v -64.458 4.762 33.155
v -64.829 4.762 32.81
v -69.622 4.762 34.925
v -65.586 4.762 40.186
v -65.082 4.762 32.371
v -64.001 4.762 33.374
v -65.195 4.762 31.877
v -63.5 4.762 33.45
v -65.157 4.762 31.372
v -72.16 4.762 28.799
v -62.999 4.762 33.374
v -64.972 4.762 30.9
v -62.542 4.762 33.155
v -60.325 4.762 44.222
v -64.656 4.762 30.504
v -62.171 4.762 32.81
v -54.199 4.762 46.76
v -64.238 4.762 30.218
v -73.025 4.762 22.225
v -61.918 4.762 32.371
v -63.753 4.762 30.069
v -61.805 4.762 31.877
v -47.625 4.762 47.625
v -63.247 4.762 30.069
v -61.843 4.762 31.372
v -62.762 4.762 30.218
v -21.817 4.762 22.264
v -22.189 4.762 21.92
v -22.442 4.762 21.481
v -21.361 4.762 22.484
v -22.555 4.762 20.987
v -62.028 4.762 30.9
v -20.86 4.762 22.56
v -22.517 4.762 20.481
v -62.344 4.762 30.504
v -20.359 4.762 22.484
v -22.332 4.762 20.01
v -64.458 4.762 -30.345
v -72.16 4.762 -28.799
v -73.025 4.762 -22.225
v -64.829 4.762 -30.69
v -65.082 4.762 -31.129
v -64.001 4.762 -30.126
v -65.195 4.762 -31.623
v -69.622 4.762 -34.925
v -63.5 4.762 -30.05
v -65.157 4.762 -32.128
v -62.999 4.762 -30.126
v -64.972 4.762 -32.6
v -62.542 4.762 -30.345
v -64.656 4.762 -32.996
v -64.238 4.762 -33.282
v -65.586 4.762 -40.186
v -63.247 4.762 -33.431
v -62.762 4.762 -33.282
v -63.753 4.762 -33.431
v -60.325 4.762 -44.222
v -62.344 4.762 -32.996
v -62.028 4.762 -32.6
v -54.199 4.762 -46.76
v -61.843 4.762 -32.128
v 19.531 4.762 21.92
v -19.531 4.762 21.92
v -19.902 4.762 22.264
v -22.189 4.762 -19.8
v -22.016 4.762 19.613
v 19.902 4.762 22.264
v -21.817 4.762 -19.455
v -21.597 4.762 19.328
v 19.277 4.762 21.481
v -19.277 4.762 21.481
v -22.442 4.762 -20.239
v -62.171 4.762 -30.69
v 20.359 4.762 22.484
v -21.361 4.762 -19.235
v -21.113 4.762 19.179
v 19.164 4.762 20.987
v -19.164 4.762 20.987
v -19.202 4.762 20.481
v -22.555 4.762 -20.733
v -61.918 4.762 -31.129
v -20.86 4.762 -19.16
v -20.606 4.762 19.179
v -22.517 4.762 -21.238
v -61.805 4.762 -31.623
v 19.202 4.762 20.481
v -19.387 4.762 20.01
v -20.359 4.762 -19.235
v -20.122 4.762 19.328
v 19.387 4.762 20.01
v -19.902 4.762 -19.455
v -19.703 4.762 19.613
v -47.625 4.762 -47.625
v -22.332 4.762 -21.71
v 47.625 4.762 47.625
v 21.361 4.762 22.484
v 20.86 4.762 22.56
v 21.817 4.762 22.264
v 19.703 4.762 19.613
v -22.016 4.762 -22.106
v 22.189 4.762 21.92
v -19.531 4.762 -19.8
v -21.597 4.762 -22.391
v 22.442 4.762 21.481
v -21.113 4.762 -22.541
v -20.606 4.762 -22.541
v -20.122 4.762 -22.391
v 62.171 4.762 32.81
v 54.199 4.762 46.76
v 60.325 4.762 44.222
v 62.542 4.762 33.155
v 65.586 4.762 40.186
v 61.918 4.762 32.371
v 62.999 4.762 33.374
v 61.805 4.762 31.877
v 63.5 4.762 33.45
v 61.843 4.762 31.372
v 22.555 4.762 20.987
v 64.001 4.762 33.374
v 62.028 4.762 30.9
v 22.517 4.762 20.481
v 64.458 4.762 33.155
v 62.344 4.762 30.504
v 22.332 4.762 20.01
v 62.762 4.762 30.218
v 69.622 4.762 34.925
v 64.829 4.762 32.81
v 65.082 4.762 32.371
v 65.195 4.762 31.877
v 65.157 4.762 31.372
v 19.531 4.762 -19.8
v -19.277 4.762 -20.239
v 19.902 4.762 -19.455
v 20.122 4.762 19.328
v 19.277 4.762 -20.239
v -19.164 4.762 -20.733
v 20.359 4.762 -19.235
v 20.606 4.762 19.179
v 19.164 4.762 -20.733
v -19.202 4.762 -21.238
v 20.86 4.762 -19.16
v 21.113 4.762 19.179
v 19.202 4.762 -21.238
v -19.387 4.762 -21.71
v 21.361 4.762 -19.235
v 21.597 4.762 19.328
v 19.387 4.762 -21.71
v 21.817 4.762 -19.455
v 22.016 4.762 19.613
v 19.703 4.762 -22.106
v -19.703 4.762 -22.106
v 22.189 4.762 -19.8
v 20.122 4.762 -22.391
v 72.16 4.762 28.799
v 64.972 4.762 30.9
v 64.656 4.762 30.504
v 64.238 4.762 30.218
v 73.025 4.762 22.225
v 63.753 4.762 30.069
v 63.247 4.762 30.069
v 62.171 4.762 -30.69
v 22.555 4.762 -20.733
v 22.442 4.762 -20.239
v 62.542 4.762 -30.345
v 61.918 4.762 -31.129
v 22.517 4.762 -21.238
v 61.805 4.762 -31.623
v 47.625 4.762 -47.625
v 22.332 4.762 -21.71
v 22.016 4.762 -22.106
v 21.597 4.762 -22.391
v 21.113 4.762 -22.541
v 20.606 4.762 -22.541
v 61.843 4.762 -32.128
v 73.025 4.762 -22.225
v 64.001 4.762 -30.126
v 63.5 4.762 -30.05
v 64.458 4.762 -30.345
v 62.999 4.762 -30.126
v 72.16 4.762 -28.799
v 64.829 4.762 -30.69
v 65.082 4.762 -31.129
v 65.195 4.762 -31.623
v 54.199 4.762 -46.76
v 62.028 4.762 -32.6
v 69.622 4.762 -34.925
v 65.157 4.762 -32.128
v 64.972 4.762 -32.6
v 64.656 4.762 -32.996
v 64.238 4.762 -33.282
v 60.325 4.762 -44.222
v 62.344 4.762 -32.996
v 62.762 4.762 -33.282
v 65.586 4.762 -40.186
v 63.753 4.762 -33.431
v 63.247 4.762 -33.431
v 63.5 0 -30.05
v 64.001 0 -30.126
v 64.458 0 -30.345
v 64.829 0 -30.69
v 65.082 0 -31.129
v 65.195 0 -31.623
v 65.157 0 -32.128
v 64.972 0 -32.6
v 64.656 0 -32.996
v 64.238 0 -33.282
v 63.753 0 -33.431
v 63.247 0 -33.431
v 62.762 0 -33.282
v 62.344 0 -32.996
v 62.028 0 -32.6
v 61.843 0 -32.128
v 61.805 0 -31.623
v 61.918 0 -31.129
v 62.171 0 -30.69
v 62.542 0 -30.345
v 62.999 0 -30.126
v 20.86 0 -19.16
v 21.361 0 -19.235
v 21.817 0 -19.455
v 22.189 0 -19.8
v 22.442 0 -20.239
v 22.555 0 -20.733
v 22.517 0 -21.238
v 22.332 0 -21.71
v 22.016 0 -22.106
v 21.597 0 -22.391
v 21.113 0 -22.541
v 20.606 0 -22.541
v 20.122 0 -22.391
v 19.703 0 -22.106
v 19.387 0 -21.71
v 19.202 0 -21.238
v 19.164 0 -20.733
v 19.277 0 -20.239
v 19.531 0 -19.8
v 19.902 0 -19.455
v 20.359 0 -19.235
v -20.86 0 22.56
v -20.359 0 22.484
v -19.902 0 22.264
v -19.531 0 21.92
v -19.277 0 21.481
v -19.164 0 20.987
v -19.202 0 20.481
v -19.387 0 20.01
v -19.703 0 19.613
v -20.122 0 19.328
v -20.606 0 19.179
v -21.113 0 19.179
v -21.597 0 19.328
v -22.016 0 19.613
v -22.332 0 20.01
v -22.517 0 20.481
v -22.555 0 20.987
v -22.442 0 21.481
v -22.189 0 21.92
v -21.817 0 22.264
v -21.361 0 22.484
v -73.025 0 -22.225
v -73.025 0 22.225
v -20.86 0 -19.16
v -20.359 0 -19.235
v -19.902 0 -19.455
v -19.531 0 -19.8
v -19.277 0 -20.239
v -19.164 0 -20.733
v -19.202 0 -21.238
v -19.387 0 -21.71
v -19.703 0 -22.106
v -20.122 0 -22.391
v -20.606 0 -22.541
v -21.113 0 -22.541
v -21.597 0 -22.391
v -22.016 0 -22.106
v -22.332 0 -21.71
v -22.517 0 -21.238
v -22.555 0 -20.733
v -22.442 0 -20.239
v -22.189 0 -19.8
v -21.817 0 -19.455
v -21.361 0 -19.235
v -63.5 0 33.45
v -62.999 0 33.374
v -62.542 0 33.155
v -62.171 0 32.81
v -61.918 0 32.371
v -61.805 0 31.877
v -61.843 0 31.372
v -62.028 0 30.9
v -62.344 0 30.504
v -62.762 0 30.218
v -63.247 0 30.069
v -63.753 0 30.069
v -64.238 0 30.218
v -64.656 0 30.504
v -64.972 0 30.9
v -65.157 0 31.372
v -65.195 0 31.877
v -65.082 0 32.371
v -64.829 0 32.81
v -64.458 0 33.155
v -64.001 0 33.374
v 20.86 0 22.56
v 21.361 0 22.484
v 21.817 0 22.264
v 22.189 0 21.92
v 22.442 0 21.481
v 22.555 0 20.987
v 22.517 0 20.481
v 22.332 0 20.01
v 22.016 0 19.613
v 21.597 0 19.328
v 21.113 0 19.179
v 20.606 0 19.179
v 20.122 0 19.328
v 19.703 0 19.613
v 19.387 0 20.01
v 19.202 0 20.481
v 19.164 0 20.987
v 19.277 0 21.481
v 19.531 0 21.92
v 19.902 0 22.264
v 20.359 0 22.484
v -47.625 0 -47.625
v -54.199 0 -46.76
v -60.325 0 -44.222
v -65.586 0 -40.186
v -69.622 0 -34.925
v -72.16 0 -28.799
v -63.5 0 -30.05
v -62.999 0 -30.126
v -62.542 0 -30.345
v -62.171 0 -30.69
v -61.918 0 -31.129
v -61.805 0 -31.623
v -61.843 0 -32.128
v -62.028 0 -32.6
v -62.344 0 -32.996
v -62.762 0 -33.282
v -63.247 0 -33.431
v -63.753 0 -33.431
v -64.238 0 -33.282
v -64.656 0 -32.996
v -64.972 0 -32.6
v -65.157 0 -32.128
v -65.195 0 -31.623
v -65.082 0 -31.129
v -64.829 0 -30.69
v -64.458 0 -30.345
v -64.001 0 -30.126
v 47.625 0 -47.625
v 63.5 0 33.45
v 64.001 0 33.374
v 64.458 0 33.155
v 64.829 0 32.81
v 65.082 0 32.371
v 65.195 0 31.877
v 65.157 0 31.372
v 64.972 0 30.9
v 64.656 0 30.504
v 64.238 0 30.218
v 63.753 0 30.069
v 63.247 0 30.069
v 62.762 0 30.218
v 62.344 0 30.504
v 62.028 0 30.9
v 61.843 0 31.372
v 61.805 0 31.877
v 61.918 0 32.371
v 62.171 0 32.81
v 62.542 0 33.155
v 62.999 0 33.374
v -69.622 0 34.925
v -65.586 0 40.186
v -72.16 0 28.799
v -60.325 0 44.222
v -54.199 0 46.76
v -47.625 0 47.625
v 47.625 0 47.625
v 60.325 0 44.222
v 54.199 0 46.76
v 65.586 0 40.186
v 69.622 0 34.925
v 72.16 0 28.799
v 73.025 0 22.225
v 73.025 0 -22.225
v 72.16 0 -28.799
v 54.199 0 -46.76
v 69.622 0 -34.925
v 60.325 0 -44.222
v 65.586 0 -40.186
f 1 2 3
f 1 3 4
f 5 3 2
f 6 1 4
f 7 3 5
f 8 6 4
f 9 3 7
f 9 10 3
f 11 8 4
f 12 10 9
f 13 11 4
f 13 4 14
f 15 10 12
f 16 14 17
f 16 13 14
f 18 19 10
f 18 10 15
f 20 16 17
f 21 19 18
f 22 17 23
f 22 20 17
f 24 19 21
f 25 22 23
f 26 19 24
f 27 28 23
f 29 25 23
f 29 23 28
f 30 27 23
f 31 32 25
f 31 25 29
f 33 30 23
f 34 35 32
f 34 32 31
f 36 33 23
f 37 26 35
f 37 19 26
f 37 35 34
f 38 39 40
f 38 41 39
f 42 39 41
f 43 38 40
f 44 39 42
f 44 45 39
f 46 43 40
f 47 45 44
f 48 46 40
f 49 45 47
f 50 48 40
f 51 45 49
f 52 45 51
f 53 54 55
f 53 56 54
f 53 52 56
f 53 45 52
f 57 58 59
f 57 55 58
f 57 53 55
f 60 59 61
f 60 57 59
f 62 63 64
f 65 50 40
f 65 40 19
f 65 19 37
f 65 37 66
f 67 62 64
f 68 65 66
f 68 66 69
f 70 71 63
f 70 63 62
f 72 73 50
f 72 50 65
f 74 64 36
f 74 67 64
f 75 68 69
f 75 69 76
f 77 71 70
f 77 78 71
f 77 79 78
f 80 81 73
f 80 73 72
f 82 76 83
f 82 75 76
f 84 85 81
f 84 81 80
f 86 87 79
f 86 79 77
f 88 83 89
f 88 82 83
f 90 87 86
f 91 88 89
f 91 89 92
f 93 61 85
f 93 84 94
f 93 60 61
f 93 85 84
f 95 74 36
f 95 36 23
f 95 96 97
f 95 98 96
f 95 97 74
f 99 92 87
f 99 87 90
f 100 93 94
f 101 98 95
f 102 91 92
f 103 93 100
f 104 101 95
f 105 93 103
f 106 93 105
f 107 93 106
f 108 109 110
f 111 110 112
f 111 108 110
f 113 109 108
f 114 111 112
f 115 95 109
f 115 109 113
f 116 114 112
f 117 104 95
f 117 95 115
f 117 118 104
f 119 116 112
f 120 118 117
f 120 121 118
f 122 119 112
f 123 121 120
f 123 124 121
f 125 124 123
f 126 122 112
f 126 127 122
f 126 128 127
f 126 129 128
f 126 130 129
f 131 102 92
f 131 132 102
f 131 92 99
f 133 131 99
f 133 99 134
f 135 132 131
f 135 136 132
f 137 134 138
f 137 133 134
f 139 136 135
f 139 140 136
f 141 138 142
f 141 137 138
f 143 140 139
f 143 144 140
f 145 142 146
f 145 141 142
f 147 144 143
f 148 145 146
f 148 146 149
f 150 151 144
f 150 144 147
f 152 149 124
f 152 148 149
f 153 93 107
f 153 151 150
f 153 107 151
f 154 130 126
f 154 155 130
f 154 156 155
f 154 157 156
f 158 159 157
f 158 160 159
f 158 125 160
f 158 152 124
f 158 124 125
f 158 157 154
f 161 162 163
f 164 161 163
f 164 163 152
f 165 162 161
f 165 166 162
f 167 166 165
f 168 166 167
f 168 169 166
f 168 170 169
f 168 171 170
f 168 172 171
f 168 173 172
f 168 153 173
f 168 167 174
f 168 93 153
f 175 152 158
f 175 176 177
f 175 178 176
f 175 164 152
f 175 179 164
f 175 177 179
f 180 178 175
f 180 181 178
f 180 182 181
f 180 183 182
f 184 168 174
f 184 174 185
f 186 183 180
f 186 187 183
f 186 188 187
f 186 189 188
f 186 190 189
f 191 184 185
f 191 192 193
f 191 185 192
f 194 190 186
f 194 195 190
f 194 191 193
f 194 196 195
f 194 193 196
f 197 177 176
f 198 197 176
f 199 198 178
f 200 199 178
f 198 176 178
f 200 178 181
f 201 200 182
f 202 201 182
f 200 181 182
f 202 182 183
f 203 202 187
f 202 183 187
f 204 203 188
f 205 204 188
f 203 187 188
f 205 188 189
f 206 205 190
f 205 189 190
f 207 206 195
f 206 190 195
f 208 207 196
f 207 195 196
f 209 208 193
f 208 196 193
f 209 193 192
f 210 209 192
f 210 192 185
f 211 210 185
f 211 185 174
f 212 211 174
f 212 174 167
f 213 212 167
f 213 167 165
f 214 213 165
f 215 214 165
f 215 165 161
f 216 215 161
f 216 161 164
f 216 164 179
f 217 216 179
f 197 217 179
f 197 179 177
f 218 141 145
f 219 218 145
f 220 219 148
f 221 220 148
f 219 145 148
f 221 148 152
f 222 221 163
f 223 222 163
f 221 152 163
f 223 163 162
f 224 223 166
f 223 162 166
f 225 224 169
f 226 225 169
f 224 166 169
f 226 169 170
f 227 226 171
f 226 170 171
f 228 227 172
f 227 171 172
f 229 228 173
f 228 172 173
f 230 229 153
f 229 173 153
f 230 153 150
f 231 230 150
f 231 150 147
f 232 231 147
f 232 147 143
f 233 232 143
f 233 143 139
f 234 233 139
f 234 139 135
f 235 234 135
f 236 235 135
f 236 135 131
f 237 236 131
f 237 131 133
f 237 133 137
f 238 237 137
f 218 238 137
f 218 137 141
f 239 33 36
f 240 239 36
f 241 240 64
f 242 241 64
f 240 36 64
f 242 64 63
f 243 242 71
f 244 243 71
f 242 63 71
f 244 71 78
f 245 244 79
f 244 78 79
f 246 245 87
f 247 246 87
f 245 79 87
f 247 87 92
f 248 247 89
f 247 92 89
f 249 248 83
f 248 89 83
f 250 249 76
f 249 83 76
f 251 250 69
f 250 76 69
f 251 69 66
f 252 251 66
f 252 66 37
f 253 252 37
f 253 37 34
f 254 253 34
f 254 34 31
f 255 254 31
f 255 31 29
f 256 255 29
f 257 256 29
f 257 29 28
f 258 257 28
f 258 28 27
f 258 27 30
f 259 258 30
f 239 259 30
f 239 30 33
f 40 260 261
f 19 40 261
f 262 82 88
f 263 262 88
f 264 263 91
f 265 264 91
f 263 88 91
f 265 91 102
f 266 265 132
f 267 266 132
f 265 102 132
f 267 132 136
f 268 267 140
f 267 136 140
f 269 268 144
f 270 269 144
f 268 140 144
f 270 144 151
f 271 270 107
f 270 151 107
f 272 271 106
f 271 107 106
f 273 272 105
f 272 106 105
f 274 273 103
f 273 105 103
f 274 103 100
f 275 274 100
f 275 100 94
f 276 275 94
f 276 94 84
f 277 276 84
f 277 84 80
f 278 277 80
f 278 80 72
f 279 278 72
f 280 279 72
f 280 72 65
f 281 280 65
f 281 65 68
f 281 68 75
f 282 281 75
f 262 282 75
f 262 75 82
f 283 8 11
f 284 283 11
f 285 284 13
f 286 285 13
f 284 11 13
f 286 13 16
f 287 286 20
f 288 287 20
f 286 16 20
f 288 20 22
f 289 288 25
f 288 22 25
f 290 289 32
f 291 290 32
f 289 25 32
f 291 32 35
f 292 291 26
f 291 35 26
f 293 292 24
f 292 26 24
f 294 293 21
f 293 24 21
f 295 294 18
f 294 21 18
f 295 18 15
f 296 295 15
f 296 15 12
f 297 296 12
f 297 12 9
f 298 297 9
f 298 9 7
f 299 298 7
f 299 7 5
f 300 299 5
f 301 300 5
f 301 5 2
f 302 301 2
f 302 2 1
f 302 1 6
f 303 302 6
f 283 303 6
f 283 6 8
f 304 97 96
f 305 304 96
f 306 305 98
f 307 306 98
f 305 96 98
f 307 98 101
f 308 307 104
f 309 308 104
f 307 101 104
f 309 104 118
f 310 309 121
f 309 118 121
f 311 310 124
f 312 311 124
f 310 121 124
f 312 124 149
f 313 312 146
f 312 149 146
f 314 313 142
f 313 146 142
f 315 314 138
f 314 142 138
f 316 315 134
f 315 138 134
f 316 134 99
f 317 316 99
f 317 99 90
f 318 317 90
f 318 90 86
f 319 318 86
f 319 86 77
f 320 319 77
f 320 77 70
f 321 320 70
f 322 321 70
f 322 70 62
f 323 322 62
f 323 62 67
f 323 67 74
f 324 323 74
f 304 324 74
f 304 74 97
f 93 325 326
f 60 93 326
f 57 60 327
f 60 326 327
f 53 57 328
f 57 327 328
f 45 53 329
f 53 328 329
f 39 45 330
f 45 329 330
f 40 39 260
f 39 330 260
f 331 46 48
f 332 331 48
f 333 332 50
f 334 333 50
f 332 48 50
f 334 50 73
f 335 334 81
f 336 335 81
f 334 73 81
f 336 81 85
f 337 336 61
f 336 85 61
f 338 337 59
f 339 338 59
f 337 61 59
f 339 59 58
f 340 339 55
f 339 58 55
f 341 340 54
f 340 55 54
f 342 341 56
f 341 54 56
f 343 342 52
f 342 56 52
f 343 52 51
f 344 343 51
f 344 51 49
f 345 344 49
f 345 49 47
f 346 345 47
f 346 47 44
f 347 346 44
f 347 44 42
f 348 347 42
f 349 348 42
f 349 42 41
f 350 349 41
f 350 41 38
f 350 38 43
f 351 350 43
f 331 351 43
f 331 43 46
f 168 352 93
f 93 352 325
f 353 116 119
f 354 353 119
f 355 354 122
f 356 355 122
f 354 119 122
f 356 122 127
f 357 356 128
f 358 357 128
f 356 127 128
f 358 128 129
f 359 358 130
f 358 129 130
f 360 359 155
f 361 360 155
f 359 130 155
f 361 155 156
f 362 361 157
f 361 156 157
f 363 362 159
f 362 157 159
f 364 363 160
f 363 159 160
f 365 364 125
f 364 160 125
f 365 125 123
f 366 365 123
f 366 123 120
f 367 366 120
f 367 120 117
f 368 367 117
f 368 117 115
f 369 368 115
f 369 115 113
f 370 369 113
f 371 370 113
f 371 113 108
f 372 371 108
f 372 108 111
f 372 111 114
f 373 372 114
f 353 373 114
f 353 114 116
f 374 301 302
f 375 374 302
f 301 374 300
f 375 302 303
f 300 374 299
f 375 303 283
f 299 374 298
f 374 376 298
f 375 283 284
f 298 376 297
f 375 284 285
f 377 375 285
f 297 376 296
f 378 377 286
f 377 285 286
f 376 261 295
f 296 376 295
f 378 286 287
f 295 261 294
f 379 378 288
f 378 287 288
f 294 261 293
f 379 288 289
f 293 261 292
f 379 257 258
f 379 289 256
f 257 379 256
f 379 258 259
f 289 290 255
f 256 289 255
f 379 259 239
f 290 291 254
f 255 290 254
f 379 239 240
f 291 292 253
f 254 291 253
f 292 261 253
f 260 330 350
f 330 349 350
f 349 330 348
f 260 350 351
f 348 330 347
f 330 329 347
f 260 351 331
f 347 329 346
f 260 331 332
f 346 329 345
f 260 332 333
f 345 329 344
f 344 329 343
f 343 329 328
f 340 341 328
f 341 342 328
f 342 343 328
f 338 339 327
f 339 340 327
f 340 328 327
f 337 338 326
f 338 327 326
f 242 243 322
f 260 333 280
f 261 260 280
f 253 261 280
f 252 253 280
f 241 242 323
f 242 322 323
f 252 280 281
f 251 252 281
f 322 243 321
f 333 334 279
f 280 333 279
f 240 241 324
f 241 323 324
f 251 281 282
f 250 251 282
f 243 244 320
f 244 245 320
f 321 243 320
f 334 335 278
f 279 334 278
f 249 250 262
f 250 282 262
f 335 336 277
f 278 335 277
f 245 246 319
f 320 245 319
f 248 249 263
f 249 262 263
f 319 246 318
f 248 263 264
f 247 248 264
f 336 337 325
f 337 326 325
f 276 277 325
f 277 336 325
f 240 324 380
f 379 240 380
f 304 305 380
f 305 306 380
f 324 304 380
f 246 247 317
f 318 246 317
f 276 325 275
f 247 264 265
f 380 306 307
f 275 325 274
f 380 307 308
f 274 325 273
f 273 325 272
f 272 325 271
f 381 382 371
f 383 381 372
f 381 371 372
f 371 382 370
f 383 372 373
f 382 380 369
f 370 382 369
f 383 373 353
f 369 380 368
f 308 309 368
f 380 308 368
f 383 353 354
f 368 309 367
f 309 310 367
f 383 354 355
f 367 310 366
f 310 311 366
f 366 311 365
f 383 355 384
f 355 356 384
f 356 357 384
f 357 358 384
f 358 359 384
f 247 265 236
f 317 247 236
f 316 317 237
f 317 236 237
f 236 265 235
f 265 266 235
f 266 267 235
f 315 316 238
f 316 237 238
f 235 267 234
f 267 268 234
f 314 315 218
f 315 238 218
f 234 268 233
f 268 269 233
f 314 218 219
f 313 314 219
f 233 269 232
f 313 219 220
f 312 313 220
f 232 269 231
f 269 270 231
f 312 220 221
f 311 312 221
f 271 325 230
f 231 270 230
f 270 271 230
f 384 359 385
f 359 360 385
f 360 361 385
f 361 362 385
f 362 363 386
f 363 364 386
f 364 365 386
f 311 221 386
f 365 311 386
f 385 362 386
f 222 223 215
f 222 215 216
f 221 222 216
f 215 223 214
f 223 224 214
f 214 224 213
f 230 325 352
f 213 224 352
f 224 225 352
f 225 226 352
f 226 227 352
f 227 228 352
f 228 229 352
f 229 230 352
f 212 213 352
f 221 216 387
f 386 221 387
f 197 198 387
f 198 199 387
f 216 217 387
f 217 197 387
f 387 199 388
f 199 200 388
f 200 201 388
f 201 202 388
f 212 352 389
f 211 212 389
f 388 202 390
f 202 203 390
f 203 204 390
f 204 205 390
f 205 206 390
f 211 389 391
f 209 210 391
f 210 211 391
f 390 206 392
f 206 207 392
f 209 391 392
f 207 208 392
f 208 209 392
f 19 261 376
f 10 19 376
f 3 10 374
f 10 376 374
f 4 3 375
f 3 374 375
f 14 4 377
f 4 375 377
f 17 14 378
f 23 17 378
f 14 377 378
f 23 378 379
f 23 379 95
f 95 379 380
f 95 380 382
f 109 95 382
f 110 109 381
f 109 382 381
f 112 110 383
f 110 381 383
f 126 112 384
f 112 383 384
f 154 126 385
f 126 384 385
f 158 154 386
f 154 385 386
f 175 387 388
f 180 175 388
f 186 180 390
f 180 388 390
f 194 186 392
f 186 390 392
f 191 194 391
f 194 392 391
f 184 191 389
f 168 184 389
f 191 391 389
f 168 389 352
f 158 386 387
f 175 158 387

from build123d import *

# Parameters (mm, degrees)
BOSS_EXTRUDE1_DEPTH = 4.7625
SKETCH2_R           = 1.7
CUT_EXTRUDE1_DEPTH  = 88.3125
SKETCH3_R           = 1.7
CUT_EXTRUDE2_DEPTH  = 88.3125


with BuildPart() as part:
    # Sketch1 → Boss-Extrude1 (new body)
    with BuildSketch(Plane(origin=(0, 0, 0), x_dir=(1, 0, 0), z_dir=(0, 1, 0))):
        with BuildLine():
            Line((-47.625, -47.625), (47.625, -47.625))
            ThreePointArc((47.625, -47.625), (65.585512242, -40.185512242), (73.025, -22.225))
            Line((73.025, -22.225), (73.025, 22.225))
            ThreePointArc((73.025, 22.225), (65.585512242, 40.185512242), (47.625, 47.625))
            Line((47.625, 47.625), (-47.625, 47.625))
            ThreePointArc((-47.625, 47.625), (-65.585512242, 40.185512242), (-73.025, 22.225))
            Line((-73.025, 22.225), (-73.025, -22.225))
            ThreePointArc((-73.025, -22.225), (-65.585512242, -40.185512242), (-47.625, -47.625))
        make_face()
    extrude(amount=BOSS_EXTRUDE1_DEPTH)

    # Sketch2 → Cut-Extrude1 (cut, through all)
    with BuildSketch(Plane(origin=(0, 4.7625, 0), x_dir=(1, 0, 0), z_dir=(0, 1, 0))):
        with Locations(Location((-63.5, -31.75, 0), (0, 0, 270))):
            Circle(SKETCH2_R)
        with Locations(Location((-63.5, 31.75, 0), (0, 0, 270))):
            Circle(SKETCH2_R)
        with Locations(Location((63.5, 31.75, 0), (0, 0, 270))):
            Circle(SKETCH2_R)
        with Locations(Location((63.5, -31.75, 0), (0, 0, 270))):
            Circle(SKETCH2_R)
    extrude(amount=-CUT_EXTRUDE1_DEPTH, mode=Mode.SUBTRACT)

    # Sketch3 → Cut-Extrude2 (cut, through all)
    with BuildSketch(Plane(origin=(0, 4.7625, 0), x_dir=(1, 0, 0), z_dir=(0, 1, 0))):
        with Locations(Location((20.859650045, 20.859650045, 0), (0, 0, 270))):
            Circle(SKETCH3_R)
        with Locations(Location((-20.859650045, 20.859650045, 0), (0, 0, 270))):
            Circle(SKETCH3_R)
        with Locations(Location((-20.859650045, -20.859650045, 0), (0, 0, 270))):
            Circle(SKETCH3_R)
        with Locations(Location((20.859650045, -20.859650045, 0), (0, 0, 270))):
            Circle(SKETCH3_R)
    extrude(amount=-CUT_EXTRUDE2_DEPTH, mode=Mode.SUBTRACT)


solid = part.part
